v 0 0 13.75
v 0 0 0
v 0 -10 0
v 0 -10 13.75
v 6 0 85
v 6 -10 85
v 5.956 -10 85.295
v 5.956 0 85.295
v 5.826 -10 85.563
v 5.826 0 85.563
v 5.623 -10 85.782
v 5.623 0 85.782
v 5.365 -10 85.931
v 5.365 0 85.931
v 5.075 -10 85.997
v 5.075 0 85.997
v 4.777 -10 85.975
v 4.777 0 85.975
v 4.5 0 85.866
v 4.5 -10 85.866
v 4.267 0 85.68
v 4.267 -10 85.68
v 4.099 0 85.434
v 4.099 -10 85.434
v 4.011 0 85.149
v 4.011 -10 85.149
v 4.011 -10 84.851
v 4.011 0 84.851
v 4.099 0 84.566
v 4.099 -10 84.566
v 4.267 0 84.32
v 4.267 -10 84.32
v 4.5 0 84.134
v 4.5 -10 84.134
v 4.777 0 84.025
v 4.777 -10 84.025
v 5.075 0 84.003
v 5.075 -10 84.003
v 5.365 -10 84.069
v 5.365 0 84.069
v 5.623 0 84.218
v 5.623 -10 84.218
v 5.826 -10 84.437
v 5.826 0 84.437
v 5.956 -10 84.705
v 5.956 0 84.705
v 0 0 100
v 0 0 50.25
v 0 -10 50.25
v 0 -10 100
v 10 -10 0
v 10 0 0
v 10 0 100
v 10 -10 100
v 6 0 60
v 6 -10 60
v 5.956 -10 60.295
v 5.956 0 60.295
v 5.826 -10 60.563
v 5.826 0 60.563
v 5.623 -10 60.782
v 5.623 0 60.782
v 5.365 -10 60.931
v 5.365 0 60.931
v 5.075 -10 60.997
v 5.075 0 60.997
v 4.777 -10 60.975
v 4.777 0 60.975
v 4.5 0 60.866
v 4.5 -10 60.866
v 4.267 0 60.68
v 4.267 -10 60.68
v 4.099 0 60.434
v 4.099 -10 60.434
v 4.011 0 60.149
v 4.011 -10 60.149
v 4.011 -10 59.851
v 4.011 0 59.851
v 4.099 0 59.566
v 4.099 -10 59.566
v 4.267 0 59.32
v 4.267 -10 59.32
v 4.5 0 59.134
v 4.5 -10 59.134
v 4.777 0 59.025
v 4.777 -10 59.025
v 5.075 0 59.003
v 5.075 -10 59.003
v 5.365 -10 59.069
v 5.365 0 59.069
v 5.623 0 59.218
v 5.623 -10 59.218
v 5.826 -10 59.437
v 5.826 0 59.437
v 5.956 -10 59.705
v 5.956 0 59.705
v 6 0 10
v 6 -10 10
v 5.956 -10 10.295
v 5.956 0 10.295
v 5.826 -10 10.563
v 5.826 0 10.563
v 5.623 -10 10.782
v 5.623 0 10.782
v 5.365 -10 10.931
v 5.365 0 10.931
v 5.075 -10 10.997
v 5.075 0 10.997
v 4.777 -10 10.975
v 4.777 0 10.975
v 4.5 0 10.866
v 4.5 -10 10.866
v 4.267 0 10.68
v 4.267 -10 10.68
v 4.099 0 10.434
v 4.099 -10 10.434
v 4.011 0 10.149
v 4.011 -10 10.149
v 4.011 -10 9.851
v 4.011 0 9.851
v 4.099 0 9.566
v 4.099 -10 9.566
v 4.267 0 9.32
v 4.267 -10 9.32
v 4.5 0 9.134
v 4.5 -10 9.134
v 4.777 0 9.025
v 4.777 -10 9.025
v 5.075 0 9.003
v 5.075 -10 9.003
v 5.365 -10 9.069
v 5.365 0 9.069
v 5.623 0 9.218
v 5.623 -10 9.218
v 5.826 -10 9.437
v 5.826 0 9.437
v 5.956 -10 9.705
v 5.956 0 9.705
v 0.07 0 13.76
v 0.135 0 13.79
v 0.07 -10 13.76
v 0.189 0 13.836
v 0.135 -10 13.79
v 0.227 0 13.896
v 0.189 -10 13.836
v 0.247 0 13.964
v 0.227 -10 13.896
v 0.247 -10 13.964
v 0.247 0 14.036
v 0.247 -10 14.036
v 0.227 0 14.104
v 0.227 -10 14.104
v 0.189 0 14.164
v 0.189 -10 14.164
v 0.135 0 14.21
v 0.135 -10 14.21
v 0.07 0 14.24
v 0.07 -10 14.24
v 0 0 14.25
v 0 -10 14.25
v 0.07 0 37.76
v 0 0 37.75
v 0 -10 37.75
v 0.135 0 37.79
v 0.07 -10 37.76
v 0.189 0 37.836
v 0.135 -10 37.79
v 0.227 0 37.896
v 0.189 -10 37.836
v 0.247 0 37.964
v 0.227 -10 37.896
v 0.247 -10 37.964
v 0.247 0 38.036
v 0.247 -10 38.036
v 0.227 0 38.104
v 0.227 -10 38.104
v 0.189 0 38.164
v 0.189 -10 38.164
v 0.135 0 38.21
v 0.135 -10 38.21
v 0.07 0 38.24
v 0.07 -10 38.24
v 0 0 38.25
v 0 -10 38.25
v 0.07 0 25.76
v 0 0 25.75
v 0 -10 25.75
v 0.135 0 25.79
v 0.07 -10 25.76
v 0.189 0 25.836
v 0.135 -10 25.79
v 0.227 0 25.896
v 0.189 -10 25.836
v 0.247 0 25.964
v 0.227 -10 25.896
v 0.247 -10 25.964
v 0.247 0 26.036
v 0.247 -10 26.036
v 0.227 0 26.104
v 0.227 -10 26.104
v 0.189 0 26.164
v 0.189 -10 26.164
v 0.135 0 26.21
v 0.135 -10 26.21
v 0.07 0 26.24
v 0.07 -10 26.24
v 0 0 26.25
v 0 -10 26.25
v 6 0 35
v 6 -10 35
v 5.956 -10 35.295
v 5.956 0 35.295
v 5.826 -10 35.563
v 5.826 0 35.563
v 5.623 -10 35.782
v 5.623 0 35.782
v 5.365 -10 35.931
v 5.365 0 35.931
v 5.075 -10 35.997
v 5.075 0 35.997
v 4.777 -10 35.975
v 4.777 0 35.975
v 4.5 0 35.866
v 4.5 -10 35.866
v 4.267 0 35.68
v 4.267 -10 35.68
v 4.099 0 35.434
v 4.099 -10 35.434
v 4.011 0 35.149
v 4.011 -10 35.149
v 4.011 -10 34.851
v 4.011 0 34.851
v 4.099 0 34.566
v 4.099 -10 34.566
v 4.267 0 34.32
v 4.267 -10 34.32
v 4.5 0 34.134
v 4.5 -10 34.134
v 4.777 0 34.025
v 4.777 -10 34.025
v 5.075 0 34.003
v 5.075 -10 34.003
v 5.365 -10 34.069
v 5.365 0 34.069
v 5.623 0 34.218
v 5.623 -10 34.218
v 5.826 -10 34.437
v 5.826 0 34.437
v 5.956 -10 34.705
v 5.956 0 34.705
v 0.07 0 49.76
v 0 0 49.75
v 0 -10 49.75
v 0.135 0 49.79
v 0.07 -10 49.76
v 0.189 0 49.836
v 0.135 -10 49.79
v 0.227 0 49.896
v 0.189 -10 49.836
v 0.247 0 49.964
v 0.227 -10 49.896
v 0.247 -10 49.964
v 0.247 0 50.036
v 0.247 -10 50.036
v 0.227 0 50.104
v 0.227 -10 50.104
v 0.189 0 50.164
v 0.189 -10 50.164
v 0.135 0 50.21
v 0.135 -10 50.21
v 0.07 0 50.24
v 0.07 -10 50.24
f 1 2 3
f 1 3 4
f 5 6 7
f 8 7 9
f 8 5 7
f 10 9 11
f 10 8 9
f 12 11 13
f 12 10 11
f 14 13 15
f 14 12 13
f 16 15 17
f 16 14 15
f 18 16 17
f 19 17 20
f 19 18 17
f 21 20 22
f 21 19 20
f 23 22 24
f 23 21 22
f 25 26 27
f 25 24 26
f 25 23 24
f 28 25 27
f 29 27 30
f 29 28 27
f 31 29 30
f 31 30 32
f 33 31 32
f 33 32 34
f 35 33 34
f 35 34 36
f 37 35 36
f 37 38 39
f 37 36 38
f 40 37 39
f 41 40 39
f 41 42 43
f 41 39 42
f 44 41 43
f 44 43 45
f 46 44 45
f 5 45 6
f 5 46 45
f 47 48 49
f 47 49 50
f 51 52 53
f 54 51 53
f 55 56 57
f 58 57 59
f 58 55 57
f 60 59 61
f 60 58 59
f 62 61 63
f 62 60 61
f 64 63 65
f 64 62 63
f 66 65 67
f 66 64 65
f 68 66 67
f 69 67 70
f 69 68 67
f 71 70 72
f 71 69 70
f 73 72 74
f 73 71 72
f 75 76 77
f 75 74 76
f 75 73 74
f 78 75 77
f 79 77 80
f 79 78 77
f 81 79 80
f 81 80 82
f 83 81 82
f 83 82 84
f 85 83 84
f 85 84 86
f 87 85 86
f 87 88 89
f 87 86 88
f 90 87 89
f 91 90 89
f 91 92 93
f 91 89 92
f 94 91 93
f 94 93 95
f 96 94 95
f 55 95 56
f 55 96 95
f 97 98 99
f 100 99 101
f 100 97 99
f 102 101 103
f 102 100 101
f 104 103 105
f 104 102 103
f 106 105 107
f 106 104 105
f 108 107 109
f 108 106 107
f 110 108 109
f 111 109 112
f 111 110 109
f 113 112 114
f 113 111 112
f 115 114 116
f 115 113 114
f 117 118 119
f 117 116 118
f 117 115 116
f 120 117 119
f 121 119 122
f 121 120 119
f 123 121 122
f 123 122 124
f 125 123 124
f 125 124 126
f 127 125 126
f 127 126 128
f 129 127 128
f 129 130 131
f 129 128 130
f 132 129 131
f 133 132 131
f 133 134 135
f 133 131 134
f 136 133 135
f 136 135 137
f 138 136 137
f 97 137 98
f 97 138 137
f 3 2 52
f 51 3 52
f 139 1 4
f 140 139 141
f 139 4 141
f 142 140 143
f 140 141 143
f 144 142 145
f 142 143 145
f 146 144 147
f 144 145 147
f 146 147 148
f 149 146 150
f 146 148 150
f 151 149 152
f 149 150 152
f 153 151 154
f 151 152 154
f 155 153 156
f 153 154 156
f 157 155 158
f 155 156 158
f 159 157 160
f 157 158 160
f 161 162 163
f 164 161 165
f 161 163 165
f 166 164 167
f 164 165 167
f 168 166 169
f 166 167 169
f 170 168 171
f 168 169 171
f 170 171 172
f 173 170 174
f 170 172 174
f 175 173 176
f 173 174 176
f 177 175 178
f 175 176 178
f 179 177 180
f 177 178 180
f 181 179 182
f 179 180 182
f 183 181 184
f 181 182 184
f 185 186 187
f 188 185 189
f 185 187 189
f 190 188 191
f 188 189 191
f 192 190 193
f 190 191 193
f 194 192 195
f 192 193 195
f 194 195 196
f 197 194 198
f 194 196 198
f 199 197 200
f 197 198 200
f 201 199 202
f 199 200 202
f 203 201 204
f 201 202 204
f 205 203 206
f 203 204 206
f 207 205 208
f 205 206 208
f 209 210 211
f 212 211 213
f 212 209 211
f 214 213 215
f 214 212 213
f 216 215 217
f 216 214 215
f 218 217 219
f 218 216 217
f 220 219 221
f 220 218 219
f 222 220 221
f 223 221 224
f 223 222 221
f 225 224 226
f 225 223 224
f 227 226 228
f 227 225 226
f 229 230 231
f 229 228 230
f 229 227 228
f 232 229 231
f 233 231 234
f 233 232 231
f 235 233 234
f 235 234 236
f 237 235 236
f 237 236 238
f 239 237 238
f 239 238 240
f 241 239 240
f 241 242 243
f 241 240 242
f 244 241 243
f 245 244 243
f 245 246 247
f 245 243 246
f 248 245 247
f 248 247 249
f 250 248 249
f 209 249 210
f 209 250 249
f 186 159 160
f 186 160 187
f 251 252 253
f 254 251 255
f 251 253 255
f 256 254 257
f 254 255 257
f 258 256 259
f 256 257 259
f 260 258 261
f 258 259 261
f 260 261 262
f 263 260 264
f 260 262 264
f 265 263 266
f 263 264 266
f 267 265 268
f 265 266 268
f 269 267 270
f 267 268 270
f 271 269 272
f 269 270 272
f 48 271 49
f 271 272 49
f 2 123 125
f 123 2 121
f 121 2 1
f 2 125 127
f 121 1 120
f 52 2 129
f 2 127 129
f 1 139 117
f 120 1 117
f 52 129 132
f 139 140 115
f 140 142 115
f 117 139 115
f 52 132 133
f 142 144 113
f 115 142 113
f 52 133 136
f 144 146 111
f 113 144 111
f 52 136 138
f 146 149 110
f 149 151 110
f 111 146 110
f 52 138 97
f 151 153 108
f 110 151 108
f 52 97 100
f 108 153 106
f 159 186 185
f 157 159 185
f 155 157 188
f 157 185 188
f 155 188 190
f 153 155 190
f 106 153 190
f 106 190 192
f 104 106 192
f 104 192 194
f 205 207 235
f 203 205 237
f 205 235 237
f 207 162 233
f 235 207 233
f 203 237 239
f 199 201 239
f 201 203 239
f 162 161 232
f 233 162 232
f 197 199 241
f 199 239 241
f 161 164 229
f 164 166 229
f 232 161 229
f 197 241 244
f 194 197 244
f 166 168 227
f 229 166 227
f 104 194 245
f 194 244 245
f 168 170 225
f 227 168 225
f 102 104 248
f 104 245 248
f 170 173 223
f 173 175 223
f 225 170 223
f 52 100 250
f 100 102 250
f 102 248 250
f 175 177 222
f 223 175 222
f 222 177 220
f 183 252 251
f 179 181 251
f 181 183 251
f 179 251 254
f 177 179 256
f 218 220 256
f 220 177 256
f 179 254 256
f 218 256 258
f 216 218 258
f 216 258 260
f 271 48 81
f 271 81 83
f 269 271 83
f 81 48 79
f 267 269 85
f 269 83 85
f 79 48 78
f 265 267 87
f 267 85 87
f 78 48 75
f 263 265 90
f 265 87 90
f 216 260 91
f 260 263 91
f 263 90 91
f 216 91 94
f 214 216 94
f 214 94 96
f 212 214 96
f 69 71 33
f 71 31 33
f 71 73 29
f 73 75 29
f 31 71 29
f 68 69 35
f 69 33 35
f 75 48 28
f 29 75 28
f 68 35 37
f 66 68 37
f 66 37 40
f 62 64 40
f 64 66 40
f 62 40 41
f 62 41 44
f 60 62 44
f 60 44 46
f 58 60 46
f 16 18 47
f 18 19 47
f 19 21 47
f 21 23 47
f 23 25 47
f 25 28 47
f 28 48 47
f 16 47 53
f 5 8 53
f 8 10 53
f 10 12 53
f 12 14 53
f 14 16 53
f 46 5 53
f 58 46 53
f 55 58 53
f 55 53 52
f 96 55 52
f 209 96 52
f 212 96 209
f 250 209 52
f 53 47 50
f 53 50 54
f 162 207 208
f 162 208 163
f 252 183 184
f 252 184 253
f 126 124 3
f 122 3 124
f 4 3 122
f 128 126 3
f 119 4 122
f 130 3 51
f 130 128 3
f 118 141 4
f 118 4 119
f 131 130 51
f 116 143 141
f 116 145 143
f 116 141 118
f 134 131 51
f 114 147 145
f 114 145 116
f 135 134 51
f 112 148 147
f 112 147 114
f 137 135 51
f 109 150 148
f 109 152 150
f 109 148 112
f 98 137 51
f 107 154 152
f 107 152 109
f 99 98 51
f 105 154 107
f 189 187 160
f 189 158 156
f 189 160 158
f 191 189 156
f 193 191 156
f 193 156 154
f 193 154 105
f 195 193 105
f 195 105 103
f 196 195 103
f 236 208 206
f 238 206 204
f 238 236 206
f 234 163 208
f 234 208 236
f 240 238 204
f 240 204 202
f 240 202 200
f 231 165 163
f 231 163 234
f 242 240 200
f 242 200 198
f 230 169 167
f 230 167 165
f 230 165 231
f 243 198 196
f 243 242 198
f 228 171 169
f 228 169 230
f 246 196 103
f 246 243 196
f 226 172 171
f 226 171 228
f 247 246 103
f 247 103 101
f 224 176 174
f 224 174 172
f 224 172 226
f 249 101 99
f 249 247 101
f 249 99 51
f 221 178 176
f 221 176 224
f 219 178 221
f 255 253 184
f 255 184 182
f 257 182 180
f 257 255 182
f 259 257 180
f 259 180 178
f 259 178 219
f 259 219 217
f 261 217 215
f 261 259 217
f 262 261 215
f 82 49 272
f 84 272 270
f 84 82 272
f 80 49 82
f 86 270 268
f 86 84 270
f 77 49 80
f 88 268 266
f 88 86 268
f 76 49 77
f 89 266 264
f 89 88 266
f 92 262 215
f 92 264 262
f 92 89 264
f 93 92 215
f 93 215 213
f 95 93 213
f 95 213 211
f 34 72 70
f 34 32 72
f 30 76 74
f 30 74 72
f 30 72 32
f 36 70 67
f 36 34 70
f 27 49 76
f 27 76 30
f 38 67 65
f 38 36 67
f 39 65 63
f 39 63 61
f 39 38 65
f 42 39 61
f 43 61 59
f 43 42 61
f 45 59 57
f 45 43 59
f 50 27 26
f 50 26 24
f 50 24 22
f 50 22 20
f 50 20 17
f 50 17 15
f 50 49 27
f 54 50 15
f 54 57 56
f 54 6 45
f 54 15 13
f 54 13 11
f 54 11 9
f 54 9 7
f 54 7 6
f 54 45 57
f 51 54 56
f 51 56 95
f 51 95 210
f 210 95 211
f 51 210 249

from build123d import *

# Parameters (mm, degrees)
F0_W     = 10
F0_H     = 100
F1_DEPTH = 10
F2_R     = 0.25
F3_DEPTH = 10.001
F4_R     = 1
F5_DEPTH = 10.001


with BuildPart() as f1:
    # F0 (on Front) → F1 (new body)
    with BuildSketch(Plane.XZ):
        with Locations((5, 50)):
            Rectangle(F0_W, F0_H)
    extrude(amount=F1_DEPTH)

    # F2 (on face) → F3 (cut, through all)
    with BuildSketch(Plane.XZ.offset(10)):
        with Locations((0, 50)):
            Circle(F2_R)
        with Locations((0, 38)):
            Circle(F2_R)
        with Locations((0, 26)):
            Circle(F2_R)
        with Locations((0, 14)):
            Circle(F2_R)
    extrude(amount=-F3_DEPTH, mode=Mode.SUBTRACT)

    # F4 (on Front) → F5 (cut, through all)
    with BuildSketch(Plane.XZ):
        with Locations((5, 85)):
            Circle(F4_R)
        with Locations((5, 60)):
            Circle(F4_R)
        with Locations((5, 35)):
            Circle(F4_R)
        with Locations((5, 10)):
            Circle(F4_R)
    extrude(amount=F5_DEPTH, mode=Mode.SUBTRACT)


solid = f1.part
